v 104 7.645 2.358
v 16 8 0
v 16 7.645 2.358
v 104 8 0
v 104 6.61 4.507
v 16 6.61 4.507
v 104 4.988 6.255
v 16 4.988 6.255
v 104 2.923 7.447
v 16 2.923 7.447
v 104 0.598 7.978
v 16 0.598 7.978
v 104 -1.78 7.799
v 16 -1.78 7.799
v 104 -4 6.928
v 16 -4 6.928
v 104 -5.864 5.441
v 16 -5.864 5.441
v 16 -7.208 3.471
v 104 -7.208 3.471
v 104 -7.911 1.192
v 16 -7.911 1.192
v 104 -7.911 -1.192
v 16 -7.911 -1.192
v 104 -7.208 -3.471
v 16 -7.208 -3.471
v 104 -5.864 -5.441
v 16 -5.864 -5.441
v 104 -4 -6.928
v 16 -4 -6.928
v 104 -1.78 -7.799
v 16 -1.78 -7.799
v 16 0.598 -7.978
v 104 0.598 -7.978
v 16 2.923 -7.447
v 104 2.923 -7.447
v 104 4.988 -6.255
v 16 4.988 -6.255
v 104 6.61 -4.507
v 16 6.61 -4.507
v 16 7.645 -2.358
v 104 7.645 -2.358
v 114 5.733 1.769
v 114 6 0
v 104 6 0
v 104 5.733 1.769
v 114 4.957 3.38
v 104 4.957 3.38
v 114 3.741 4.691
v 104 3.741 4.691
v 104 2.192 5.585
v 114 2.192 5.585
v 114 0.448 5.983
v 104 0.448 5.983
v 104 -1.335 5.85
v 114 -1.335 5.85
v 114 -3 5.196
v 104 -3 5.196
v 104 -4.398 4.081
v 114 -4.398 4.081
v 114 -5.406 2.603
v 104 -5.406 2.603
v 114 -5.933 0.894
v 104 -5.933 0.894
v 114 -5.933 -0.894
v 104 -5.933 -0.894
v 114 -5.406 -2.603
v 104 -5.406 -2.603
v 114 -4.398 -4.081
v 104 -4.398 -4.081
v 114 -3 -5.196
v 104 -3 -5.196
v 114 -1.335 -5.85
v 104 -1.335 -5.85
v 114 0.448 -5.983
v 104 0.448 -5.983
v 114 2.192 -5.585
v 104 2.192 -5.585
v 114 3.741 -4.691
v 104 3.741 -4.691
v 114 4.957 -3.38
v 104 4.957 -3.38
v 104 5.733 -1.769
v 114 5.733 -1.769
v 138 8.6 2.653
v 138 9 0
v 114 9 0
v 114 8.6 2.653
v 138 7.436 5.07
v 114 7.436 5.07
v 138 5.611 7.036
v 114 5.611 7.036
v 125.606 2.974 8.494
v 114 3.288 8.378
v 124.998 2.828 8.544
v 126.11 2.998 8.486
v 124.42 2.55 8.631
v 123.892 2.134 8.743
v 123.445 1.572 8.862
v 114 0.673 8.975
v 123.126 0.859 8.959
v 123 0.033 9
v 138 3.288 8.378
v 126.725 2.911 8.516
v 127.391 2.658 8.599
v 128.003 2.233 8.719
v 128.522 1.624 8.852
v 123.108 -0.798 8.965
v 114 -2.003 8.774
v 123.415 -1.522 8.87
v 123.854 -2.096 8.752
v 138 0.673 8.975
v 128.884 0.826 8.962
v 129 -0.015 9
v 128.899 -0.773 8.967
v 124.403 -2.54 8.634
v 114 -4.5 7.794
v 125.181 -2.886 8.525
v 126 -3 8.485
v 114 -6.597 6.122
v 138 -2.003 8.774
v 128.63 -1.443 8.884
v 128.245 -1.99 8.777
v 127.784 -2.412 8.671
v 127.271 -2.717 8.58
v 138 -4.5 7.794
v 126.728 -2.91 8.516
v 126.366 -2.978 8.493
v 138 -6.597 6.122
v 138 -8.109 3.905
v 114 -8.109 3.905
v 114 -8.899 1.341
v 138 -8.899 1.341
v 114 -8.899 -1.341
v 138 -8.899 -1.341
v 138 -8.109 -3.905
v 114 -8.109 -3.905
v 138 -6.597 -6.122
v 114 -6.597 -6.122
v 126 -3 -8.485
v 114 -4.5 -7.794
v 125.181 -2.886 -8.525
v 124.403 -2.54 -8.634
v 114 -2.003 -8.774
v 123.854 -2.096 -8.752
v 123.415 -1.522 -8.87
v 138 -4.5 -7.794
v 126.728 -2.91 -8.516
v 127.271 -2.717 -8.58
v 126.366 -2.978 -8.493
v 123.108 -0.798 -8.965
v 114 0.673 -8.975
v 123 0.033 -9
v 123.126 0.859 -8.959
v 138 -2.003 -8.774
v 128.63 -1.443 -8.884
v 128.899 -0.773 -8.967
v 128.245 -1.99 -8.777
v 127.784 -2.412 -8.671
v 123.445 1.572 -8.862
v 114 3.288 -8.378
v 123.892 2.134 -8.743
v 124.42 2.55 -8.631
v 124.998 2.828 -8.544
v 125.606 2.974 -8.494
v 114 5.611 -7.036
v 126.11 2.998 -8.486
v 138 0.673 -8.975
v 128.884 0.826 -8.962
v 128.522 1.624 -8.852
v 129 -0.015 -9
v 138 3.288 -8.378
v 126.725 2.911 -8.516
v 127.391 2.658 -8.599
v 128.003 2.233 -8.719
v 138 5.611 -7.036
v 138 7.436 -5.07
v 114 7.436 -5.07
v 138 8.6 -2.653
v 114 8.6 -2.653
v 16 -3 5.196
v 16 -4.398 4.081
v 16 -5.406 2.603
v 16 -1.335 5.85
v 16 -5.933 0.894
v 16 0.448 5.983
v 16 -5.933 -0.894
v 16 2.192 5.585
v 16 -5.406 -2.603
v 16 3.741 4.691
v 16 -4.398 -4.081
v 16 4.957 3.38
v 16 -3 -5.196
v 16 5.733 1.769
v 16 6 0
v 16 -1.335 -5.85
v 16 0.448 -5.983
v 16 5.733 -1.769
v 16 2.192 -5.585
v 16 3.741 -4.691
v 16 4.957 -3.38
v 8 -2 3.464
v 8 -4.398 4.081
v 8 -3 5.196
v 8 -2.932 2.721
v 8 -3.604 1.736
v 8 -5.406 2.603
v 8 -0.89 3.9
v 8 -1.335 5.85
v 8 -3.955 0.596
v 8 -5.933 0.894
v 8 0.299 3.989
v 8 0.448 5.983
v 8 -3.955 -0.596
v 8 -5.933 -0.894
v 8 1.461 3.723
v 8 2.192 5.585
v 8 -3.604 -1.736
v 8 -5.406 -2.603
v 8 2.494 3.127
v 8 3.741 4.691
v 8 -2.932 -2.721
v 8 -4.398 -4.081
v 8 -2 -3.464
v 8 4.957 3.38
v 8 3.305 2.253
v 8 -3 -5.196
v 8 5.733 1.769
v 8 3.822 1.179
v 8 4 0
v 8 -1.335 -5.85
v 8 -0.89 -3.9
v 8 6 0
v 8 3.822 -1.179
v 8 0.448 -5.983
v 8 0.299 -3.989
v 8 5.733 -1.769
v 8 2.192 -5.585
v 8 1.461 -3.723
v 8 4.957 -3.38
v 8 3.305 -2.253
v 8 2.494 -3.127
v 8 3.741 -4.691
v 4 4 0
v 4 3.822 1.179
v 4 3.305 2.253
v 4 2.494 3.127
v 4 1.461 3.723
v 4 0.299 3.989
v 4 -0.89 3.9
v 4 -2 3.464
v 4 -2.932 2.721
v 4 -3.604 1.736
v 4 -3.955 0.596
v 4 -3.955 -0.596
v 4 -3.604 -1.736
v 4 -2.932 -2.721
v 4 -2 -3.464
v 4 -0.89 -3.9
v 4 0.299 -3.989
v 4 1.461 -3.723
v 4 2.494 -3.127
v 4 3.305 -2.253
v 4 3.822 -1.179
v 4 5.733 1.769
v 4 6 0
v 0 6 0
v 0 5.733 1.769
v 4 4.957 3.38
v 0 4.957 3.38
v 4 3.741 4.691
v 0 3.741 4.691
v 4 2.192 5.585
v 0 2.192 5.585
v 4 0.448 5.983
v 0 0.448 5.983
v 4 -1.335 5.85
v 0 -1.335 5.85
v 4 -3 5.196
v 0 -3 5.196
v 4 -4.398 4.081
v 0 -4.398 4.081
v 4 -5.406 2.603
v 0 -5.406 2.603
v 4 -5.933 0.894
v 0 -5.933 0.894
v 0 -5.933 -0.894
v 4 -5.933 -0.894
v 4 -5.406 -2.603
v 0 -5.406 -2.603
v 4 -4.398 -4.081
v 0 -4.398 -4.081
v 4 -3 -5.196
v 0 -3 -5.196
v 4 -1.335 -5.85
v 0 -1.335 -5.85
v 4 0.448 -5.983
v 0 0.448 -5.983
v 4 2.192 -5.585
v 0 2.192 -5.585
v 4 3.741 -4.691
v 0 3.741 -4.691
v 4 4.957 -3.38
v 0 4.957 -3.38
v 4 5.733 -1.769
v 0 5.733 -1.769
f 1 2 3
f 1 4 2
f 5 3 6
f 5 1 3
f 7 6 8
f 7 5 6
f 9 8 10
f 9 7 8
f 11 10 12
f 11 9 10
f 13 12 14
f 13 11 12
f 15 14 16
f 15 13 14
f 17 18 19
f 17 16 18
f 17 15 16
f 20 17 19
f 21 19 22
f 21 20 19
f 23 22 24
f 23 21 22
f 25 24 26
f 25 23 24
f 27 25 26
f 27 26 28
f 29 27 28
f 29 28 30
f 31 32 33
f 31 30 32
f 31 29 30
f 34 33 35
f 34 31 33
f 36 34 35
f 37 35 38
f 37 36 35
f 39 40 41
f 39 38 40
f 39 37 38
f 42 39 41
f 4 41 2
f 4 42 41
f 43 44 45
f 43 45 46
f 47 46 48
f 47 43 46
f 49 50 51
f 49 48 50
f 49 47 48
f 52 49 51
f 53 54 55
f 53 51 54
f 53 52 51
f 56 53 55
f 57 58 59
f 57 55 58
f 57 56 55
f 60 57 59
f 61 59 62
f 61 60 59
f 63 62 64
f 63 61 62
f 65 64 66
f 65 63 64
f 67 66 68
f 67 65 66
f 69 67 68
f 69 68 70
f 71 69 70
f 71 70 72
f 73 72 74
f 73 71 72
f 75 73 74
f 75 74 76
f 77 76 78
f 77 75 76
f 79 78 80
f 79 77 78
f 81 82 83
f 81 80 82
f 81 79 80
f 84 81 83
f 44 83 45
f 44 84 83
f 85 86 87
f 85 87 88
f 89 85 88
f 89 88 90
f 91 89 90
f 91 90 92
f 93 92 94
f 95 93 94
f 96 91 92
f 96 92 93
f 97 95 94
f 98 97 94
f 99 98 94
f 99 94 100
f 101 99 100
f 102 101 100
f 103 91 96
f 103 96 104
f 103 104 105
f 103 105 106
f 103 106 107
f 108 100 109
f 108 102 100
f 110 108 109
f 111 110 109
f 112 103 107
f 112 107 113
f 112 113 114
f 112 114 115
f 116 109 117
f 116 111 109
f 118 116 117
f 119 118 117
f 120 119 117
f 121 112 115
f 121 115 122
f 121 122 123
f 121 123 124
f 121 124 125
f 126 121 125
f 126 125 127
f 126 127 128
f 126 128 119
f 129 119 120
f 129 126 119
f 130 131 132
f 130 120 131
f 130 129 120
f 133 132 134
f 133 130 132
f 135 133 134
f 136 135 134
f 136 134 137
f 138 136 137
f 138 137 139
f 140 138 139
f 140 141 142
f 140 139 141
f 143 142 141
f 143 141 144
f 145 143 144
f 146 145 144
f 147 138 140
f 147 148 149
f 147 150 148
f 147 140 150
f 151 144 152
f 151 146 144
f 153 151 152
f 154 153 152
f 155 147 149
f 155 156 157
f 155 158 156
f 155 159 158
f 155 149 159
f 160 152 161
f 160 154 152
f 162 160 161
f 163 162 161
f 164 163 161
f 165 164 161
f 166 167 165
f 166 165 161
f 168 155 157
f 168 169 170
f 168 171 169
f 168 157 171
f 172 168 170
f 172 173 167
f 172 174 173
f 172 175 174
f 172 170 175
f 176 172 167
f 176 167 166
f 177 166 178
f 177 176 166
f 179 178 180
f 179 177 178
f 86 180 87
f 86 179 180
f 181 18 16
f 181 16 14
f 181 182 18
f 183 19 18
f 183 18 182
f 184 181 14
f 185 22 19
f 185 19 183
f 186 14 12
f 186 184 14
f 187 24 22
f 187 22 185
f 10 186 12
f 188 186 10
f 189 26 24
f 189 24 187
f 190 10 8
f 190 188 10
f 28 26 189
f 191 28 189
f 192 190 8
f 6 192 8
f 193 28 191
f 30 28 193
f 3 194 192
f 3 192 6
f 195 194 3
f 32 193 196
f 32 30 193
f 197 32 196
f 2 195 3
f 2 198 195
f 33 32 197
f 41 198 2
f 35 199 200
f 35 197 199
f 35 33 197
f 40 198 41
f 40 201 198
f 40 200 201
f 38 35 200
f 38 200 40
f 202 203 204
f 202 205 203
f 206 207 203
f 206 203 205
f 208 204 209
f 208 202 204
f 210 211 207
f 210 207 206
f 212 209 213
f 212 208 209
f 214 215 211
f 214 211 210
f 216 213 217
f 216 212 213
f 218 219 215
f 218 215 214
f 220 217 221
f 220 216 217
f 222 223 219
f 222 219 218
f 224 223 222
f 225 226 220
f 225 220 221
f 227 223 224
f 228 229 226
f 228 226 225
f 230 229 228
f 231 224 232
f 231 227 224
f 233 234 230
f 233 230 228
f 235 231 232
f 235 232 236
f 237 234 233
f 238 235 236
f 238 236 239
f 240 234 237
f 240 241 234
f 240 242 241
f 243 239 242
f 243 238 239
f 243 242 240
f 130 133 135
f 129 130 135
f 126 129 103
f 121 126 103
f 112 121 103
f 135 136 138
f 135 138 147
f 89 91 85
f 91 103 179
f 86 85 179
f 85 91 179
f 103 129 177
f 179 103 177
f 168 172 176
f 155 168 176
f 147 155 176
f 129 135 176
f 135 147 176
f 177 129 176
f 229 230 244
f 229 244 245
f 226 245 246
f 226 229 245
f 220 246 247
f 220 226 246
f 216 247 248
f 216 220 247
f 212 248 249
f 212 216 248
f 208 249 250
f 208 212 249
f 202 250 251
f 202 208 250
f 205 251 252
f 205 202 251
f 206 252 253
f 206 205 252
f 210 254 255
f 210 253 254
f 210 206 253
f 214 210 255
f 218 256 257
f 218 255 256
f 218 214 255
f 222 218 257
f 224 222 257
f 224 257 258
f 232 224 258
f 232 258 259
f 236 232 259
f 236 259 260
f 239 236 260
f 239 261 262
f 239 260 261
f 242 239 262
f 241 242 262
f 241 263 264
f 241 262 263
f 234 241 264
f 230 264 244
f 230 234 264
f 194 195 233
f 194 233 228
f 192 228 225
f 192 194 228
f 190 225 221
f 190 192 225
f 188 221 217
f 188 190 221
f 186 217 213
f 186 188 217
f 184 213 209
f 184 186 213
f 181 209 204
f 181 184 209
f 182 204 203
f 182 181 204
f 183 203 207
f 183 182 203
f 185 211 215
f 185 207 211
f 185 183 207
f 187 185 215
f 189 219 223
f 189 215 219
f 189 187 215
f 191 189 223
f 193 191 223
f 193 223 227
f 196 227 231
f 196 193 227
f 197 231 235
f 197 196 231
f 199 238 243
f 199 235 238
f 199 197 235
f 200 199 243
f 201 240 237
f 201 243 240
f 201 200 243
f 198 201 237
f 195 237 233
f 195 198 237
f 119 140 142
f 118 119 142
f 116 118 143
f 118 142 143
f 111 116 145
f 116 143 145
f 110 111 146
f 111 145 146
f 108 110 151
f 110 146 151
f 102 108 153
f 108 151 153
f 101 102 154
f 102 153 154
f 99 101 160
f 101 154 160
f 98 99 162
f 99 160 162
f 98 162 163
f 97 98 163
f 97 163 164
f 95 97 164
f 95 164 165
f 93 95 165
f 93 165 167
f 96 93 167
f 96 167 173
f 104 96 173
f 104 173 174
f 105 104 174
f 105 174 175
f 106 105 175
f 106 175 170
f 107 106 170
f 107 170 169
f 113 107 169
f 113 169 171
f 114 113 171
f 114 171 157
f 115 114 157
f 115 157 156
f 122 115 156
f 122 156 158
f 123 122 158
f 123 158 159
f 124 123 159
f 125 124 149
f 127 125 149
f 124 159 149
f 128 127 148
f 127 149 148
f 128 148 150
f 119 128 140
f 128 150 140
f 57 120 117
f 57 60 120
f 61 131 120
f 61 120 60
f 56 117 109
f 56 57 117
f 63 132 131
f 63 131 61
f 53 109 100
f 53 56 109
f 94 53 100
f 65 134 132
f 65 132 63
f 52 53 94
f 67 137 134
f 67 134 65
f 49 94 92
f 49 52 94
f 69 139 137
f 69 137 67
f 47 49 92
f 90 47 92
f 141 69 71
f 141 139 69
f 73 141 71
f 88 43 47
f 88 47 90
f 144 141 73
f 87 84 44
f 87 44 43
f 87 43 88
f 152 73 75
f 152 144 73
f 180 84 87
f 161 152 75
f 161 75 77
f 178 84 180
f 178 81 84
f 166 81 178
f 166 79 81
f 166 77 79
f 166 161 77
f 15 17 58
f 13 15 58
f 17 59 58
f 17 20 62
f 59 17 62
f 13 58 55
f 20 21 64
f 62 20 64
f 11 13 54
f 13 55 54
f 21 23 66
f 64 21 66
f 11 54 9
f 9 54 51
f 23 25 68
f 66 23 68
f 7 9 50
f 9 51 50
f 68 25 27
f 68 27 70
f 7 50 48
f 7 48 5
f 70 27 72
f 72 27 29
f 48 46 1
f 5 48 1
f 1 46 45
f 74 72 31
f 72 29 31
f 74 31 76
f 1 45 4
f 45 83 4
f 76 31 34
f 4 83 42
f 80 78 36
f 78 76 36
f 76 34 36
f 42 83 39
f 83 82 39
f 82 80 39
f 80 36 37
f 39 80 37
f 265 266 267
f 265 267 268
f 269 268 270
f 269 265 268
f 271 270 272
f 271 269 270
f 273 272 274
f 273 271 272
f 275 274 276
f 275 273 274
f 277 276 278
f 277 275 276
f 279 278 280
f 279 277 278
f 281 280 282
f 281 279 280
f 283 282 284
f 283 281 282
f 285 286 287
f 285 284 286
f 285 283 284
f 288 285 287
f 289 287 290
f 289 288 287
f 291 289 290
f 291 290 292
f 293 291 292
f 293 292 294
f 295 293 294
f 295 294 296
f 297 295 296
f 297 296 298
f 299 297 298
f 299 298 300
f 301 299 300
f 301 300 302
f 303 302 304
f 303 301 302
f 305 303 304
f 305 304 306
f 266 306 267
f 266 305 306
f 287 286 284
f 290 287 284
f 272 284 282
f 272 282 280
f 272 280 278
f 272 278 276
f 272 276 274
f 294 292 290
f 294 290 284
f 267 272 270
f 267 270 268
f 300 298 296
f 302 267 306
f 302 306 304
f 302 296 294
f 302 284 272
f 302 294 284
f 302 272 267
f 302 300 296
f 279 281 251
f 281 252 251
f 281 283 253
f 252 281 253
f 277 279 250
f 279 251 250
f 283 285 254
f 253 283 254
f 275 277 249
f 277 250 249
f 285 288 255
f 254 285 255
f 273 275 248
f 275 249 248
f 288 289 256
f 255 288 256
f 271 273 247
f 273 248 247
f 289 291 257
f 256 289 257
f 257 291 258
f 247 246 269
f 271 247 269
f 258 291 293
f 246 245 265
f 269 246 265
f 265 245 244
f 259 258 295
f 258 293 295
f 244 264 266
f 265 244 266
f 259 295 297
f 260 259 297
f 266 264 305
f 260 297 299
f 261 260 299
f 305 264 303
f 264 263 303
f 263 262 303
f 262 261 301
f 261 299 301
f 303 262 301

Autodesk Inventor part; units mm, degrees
ref_plane "YZ Plane" through (0, 0, 0) normal (1, 0, 0) x (0, 1, 0)
ref_plane "XZ Plane" through (0, 0, 0) normal (0, 1, 0) x (-1, 0, 0)
ref_plane "XY Plane" through (0, 0, 0) normal (0, 0, 1) x (1, 0, 0)
sketch "Esboço1" plane through (0, 0, 0) normal (0, 0, 1) x (1, 0, 0)
  line L0 (0, 0) -> (0, 6)
  line L1 (0, 6) -> (4, 6)
  line L2 (4, 6) -> (4, 4)
  line L3 (4, 4) -> (8, 4)
  line L4 (8, 4) -> (8, 6)
  line L5 (8, 6) -> (16, 6)
  line L6 (16, 6) -> (16, 8)
  line L7 (16, 8) -> (104, 8)
  line L8 (104, 8) -> (104, 6)
  line L9 (104, 6) -> (114, 6)
  line L10 (114, 6) -> (114, 9)
  line L11 (114, 9) -> (138, 9)
  line L12 (138, 9) -> (138, 0)
  line L13 (138, 0) -> (0, 0)
  dimension "d0" = 6
  dimension "d1" = 4
  dimension "d2" = 2
  dimension "d3" = 4
  dimension "d4" = 2
  dimension "d5" = 8
  dimension "d6" = 2
  dimension "d7" = 88
  dimension "d11" = 2
  dimension "d12" = 10
  dimension "d13" = 3
  dimension "d14" = 24
revolve "Revolução1" add sketch "Esboço1" angle 360 about axis through (138, 0, 0) along (-1, 0, 0)
sketch "Esboço2" plane through (0, 0, 0) normal (0, 0, 1) x (1, 0, 0)
  line L0 (138, -9) -> (138, 9) projected
  line L1 (138, 0) -> (126, 0)
  point P0 (0, 0)
  dimension "d16" = 12
hole "Furo1" at (126, 0, 0) direction (0, 0, -1) diameter 6 end through all both
thread "Rosca1" size "M16x1" class "6g" standard "ANSI Metric M Profile" full length
properties part number "haste_roscada" material "Aluminum 6061-AHC"
